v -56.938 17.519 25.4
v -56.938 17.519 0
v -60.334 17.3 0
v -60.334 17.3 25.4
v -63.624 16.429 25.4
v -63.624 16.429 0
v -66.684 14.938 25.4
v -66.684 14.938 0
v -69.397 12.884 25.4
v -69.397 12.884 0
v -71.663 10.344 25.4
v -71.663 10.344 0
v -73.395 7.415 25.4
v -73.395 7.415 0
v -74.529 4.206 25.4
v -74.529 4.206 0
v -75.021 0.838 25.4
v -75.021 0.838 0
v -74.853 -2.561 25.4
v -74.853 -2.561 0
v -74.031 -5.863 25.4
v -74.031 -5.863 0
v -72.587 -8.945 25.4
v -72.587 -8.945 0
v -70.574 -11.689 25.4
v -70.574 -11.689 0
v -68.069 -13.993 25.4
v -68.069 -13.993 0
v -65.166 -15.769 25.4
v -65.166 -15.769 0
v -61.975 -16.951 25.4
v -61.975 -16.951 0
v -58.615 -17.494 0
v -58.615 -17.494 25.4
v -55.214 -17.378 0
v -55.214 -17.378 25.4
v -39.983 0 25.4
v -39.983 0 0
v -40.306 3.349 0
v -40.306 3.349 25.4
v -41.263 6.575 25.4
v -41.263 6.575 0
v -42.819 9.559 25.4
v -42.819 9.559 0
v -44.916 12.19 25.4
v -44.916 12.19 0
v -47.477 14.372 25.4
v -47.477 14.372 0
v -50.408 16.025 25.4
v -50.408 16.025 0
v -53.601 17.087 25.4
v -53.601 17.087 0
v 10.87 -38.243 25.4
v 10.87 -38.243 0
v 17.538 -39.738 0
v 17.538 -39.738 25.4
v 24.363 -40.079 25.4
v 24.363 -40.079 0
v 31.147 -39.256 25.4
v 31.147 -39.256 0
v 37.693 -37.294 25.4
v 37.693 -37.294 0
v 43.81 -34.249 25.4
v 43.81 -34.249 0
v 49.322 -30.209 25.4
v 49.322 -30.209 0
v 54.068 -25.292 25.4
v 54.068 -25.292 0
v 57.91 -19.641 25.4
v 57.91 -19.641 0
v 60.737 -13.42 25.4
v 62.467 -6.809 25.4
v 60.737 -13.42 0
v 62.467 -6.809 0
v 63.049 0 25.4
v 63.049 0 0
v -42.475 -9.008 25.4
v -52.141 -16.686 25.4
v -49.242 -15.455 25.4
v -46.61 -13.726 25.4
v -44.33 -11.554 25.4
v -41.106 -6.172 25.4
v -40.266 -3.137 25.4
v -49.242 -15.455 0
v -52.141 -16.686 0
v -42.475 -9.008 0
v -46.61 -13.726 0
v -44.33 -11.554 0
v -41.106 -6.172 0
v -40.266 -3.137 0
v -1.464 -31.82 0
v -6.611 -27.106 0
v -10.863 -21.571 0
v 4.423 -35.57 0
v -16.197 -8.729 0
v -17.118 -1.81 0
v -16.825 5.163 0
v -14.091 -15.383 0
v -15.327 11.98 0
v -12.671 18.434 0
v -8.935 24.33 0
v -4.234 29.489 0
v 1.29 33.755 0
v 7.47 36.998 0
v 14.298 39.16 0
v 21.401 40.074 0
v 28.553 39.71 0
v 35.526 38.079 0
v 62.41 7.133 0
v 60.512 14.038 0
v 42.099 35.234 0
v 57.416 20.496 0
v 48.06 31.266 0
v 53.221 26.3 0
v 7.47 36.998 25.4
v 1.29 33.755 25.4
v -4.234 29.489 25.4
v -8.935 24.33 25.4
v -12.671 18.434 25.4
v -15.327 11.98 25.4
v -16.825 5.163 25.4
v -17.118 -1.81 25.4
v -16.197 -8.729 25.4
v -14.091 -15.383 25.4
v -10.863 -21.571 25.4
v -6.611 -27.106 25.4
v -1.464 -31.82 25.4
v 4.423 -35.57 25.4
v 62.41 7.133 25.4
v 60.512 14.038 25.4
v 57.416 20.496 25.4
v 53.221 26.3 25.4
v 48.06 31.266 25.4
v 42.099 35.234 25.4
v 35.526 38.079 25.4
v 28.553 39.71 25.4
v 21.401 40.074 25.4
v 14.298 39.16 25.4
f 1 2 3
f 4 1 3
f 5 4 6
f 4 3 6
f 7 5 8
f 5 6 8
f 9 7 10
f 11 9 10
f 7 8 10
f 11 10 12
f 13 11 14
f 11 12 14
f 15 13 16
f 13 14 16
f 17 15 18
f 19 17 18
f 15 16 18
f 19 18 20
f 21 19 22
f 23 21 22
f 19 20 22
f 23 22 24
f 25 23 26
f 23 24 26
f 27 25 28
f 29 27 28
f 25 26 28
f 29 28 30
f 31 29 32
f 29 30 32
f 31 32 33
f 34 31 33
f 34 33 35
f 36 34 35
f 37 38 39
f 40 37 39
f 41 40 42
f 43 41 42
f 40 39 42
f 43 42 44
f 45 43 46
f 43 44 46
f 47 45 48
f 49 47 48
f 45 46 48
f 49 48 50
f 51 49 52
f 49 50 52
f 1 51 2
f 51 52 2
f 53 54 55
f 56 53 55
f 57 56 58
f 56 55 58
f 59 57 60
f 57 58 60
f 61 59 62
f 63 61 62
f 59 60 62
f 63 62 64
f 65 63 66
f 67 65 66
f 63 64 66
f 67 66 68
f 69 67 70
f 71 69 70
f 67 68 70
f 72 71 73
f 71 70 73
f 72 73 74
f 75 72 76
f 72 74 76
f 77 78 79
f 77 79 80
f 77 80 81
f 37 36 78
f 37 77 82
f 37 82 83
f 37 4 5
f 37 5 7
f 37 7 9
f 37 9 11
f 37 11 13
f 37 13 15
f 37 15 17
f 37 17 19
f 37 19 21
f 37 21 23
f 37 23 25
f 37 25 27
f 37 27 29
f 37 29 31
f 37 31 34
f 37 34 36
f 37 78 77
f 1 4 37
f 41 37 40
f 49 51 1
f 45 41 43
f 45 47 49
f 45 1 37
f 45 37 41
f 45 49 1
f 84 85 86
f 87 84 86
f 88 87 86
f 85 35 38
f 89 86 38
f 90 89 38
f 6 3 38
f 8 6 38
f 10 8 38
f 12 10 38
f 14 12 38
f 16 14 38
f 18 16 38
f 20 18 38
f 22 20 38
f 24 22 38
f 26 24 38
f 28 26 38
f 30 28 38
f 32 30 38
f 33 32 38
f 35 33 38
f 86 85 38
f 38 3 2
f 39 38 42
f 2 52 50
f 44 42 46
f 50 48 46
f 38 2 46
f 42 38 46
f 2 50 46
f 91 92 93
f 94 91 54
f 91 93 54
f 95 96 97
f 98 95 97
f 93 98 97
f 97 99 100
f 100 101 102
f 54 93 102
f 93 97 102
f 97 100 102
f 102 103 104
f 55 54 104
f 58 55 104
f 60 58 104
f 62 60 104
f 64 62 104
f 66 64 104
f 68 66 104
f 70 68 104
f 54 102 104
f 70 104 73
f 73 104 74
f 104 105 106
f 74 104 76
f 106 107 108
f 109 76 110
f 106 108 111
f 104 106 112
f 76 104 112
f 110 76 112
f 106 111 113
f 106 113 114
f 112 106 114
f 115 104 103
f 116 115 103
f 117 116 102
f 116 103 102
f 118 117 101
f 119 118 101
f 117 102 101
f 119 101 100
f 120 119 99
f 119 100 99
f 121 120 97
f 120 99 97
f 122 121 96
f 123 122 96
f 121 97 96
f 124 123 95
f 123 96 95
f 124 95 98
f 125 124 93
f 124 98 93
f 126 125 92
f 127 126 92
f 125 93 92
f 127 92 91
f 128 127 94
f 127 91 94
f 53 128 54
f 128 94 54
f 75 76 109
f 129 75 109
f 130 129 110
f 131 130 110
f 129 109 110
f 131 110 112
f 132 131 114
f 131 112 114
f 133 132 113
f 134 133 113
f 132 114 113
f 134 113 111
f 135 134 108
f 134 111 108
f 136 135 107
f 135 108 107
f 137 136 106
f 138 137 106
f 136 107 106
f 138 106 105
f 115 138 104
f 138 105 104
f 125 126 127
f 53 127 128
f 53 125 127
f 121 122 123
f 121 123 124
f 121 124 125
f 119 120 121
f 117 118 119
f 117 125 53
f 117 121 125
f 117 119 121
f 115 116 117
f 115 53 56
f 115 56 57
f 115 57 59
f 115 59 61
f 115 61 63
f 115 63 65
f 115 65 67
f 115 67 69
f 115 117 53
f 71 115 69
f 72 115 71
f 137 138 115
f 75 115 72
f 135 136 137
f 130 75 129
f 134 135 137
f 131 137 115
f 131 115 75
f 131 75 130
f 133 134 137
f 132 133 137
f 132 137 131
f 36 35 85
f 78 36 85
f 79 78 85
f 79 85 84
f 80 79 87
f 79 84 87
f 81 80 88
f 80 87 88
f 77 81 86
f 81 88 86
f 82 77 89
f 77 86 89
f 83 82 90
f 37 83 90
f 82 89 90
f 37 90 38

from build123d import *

# Parameters (mm, degrees)
F1_DEPTH = 25.4


with BuildPart() as f1:
    # F0 (on Top) → F1 (new body)
    with BuildSketch(Plane.XY):
        with BuildLine():
            ThreePointArc((-55.21362, -17.377551), (-44.32954, -11.553697), (-39.982982, 0))
            ThreePointArc((-39.982982, 0), (-44.915902, 12.190295), (-56.938247, 17.519478))
            ThreePointArc((-56.938247, 17.519478), (-75.019346, -0.865229), (-55.21362, -17.377551))
        make_face()
        with BuildLine():
            ThreePointArc((63.049, 0), (45.16816, 33.383483), (7.470462, 36.998024))
            ThreePointArc((7.470462, 36.998024), (-17.117838, -1.810307), (10.870338, -38.24289))
            ThreePointArc((10.870338, -38.24289), (46.652453, -32.346296), (63.049, 0))
        make_face()
    extrude(amount=F1_DEPTH)


solid = f1.part
